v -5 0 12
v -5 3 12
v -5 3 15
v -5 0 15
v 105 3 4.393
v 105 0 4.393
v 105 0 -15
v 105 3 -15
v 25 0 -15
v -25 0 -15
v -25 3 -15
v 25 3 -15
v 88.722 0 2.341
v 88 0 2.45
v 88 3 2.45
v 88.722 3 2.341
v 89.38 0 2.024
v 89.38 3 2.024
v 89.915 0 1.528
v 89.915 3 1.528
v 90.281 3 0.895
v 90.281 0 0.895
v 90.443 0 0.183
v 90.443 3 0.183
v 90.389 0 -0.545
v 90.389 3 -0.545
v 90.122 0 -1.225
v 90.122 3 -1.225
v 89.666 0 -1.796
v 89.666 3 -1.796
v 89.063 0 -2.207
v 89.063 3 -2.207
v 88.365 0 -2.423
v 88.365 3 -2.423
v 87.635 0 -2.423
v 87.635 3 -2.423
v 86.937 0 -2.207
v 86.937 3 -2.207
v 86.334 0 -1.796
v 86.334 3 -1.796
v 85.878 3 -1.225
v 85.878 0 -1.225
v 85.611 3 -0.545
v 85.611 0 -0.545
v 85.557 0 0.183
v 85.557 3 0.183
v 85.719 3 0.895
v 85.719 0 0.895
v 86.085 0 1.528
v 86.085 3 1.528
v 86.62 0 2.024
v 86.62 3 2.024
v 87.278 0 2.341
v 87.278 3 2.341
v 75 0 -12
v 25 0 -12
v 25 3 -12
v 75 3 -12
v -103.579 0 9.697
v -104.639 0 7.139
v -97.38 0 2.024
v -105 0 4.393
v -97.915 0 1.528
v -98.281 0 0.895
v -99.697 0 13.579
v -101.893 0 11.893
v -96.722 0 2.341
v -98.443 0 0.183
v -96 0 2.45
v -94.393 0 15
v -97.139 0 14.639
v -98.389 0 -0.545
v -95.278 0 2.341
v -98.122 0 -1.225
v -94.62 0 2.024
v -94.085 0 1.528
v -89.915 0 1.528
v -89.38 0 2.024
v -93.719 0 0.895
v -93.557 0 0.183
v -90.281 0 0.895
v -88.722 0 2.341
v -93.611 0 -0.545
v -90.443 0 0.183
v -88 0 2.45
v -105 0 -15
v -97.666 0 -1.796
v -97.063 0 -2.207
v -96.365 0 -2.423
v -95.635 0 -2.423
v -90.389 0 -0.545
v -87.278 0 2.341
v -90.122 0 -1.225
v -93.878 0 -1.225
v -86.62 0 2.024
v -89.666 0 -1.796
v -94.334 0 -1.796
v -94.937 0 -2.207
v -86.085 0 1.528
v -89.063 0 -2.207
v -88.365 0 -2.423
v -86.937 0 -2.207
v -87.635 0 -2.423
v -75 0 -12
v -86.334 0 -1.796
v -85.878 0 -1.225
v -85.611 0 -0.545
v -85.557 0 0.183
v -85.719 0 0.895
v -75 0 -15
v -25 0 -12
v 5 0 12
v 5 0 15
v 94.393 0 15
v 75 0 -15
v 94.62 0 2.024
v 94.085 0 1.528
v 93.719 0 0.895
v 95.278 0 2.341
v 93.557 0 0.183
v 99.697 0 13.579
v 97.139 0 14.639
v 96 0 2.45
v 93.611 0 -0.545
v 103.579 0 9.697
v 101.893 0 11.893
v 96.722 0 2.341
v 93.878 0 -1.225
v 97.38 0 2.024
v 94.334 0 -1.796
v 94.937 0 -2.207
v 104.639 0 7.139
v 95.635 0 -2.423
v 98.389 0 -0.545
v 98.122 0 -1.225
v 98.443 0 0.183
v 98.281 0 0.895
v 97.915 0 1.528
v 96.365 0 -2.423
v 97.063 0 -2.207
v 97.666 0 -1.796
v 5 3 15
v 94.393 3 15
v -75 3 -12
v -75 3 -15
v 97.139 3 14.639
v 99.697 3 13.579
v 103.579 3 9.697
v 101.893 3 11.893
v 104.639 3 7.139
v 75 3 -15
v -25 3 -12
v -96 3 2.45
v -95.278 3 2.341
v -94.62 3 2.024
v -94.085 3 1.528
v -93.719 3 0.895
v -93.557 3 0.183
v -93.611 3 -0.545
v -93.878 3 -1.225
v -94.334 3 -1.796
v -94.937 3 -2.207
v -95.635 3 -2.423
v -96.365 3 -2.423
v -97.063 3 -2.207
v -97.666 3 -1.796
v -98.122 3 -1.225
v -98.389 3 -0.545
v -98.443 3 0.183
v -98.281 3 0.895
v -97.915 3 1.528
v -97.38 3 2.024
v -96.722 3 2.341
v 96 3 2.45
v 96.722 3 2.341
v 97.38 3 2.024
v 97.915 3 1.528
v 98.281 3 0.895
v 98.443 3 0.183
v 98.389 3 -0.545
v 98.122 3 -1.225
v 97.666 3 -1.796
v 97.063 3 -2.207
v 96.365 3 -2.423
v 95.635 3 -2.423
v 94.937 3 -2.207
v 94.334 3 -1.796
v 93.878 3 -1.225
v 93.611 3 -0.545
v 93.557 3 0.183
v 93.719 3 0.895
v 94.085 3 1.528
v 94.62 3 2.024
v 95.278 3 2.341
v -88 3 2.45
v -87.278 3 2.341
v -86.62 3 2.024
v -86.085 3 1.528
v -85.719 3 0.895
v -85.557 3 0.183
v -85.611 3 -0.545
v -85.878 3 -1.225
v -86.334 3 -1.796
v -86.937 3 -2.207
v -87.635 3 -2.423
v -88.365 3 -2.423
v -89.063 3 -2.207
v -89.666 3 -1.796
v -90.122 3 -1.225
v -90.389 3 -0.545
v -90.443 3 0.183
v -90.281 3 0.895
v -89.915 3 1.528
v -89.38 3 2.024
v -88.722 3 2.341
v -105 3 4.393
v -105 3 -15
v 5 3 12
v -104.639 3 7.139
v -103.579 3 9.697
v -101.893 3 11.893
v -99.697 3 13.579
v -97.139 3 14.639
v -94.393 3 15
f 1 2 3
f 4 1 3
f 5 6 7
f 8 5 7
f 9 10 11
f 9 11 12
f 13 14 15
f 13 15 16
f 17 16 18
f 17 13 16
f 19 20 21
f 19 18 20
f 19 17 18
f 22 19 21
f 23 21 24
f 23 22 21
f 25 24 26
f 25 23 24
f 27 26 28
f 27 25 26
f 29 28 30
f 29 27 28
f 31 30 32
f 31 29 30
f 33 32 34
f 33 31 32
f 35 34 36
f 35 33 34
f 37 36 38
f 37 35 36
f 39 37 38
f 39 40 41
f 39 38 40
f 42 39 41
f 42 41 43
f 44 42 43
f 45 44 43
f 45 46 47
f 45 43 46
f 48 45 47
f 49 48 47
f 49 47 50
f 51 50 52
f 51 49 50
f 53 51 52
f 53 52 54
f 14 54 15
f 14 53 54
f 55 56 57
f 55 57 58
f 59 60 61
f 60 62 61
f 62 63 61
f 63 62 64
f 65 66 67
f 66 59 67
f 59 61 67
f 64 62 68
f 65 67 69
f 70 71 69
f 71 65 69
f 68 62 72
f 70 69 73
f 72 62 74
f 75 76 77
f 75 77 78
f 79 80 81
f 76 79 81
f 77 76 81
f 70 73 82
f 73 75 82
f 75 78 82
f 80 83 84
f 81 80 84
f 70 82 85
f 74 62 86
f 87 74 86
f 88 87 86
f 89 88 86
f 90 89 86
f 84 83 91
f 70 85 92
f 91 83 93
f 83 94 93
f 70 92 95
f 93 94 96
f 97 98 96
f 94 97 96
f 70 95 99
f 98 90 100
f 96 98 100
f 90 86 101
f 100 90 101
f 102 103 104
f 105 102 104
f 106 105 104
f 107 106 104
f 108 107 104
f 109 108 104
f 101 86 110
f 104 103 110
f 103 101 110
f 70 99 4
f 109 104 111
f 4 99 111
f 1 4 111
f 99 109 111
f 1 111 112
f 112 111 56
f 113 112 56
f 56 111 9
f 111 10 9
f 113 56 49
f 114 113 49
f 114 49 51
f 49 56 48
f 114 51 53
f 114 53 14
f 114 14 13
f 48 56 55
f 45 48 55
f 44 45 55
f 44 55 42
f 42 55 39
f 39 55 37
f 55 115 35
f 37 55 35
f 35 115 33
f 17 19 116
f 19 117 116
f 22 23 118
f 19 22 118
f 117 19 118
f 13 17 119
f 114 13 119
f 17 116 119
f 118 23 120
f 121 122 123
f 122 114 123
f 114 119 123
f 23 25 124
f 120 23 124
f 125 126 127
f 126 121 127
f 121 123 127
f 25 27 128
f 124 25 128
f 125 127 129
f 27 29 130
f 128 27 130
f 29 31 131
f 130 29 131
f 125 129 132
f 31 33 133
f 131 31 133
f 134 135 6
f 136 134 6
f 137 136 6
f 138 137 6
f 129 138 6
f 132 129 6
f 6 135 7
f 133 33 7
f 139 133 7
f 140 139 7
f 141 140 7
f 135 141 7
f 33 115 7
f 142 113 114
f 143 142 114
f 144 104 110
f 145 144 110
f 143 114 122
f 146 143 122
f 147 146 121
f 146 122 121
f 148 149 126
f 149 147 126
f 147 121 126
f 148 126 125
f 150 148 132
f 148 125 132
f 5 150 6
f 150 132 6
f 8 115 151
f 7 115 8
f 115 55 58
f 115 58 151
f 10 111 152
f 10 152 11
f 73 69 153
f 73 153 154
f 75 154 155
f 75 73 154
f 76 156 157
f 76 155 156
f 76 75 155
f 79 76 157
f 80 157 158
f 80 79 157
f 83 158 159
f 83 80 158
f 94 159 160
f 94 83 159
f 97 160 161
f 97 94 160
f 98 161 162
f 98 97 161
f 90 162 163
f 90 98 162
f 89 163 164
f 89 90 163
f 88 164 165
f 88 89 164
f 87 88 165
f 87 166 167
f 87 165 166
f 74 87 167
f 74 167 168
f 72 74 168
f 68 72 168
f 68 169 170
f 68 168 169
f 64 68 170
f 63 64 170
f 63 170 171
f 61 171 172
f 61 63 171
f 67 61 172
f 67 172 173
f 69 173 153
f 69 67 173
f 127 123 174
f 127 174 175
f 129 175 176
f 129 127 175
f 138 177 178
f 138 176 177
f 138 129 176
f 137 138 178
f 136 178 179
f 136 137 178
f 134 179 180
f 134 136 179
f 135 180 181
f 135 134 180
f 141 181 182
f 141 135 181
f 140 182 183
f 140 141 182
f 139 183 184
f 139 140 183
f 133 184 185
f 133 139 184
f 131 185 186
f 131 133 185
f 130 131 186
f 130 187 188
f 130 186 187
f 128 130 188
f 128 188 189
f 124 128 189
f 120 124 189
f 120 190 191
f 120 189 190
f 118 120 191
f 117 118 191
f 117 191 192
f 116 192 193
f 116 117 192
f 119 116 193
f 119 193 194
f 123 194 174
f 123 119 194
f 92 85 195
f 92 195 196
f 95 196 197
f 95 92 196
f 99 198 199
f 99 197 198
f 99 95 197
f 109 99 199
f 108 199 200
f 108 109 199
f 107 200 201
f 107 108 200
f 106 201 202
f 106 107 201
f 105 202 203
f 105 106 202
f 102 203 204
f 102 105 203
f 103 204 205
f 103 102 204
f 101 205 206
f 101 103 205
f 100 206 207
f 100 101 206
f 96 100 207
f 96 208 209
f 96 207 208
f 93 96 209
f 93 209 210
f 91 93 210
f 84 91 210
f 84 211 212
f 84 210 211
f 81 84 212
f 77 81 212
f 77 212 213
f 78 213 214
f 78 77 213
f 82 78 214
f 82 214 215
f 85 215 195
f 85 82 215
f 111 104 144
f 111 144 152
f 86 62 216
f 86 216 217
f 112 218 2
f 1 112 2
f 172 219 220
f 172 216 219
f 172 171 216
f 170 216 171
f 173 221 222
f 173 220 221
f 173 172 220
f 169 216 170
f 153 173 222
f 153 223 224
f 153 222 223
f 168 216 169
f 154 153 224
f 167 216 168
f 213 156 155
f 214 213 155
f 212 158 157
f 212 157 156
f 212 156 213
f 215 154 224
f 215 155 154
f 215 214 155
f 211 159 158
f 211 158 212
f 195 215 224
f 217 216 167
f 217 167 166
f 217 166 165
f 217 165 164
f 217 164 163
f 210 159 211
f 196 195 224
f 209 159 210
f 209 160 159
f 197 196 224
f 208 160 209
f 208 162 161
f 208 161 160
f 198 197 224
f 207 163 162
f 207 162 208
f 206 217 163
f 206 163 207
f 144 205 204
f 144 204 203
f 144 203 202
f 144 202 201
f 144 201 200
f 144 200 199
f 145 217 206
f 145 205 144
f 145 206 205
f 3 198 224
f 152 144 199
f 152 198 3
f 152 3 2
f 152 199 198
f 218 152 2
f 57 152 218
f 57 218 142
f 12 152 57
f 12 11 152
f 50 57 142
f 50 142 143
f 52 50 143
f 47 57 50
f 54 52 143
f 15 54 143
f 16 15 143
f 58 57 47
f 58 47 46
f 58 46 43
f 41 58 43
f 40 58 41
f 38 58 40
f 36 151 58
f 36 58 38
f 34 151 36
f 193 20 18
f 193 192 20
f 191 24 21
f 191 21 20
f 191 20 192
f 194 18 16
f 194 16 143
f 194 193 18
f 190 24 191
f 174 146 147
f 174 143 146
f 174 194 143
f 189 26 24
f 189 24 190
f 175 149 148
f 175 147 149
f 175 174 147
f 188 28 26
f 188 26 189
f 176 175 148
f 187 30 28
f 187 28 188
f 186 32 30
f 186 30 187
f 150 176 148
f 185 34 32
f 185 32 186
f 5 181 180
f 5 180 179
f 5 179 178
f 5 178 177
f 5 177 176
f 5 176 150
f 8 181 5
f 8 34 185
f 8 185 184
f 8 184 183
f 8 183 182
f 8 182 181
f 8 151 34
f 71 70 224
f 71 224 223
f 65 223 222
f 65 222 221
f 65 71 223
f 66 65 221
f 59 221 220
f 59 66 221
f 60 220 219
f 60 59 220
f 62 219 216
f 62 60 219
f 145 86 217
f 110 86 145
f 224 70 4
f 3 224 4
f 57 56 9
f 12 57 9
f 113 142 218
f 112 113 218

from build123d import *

# Parameters (mm, degrees)
SKETCH1_W               = 210
SKETCH1_H               = 30
BOSS_EXTRUDE1_DEPTH     = 3
CUT_EXTRUDE1_DEPTH      = 107.108435103
CUT_EXTRUDE1_DEPTH_BACK = 107.108435103
SKETCH2_W               = 50
SKETCH2_H               = 3
CUT_EXTRUDE2_DEPTH      = 107.108435103
CUT_EXTRUDE2_DEPTH_BACK = 107.108435103
CUT_EXTRUDE4_DEPTH      = 107.108435103
CUT_EXTRUDE4_DEPTH_BACK = 107.108435103
SKETCH5_R               = 2.45
CUT_EXTRUDE5_DEPTH      = 107.108435103
CUT_EXTRUDE5_DEPTH_BACK = 107.108435103


with BuildPart() as part:
    # Sketch1 → Boss-Extrude1 (new body)
    with BuildSketch(Plane(origin=(0, 0, 0), x_dir=(1, 0, 0), z_dir=(0, 1, 0))):
        Rectangle(SKETCH1_W, SKETCH1_H)
    extrude(amount=BOSS_EXTRUDE1_DEPTH)

    # Sketch2 → Cut-Extrude1 (cut, two sides: drawn at the far end of the back side and taken through both)
    with BuildSketch(Plane(origin=(0, 3, 0), x_dir=(1, 0, 0), z_dir=(0, 1, 0)).offset(-CUT_EXTRUDE1_DEPTH_BACK)):
        with Locations((-50, 13.5)):
            Rectangle(SKETCH2_W, SKETCH2_H)
        with Locations((50, 13.5)):
            Rectangle(SKETCH2_W, SKETCH2_H)
    extrude(amount=CUT_EXTRUDE1_DEPTH + CUT_EXTRUDE1_DEPTH_BACK, mode=Mode.SUBTRACT)

    # Sketch3 → Cut-Extrude2 (cut, two sides: drawn at the far end of the back side and taken through both)
    with BuildSketch(Plane.XZ.offset(-CUT_EXTRUDE2_DEPTH_BACK)):
        Polygon((0, 15), (5, 15), (5, 12), (-5, 12), (-5, 15), align=None)
    extrude(amount=CUT_EXTRUDE2_DEPTH + CUT_EXTRUDE2_DEPTH_BACK, mode=Mode.SUBTRACT)

    # Sketch5 → Cut-Extrude4 (cut, two sides: drawn at the far end of the back side and taken through both)
    with BuildSketch(Plane(origin=(0, 0, 0), x_dir=(1, 0, 0), z_dir=(0, 1, 0)).offset(-CUT_EXTRUDE4_DEPTH_BACK)):
        with Locations(Location((-96, 0, 0), (0, 0, 270))):
            Circle(SKETCH5_R)
        with Locations(Location((-88, 0, 0), (0, 0, 270))):
            Circle(SKETCH5_R)
        with Locations(Location((88, 0, 0), (0, 0, 270))):
            Circle(SKETCH5_R)
        with Locations(Location((96, 0, 0), (0, 0, 270))):
            Circle(SKETCH5_R)
    extrude(amount=CUT_EXTRUDE4_DEPTH + CUT_EXTRUDE4_DEPTH_BACK, mode=Mode.SUBTRACT)

    # Sketch6 → Cut-Extrude5 (cut, two sides: drawn at the far end of the back side and taken through both)
    with BuildSketch(Plane(origin=(0, 0, 0), x_dir=(1, 0, 0), z_dir=(0, 1, 0)).offset(-CUT_EXTRUDE5_DEPTH_BACK)):
        with BuildLine():
            Line((-105, -4.393398282), (-105, -15))
            Line((-105, -15), (-94.393398282, -15))
            ThreePointArc((-94.393398282, -15), (-101.893398282, -11.893398282), (-105, -4.393398282))
        make_face()
        with BuildLine():
            Line((105, -15), (94.393398282, -15))
            ThreePointArc((94.393398282, -15), (101.893398282, -11.893398282), (105, -4.393398282))
            Line((105, -4.393398282), (105, -15))
        make_face()
    extrude(amount=CUT_EXTRUDE5_DEPTH + CUT_EXTRUDE5_DEPTH_BACK, mode=Mode.SUBTRACT)


solid = part.part
